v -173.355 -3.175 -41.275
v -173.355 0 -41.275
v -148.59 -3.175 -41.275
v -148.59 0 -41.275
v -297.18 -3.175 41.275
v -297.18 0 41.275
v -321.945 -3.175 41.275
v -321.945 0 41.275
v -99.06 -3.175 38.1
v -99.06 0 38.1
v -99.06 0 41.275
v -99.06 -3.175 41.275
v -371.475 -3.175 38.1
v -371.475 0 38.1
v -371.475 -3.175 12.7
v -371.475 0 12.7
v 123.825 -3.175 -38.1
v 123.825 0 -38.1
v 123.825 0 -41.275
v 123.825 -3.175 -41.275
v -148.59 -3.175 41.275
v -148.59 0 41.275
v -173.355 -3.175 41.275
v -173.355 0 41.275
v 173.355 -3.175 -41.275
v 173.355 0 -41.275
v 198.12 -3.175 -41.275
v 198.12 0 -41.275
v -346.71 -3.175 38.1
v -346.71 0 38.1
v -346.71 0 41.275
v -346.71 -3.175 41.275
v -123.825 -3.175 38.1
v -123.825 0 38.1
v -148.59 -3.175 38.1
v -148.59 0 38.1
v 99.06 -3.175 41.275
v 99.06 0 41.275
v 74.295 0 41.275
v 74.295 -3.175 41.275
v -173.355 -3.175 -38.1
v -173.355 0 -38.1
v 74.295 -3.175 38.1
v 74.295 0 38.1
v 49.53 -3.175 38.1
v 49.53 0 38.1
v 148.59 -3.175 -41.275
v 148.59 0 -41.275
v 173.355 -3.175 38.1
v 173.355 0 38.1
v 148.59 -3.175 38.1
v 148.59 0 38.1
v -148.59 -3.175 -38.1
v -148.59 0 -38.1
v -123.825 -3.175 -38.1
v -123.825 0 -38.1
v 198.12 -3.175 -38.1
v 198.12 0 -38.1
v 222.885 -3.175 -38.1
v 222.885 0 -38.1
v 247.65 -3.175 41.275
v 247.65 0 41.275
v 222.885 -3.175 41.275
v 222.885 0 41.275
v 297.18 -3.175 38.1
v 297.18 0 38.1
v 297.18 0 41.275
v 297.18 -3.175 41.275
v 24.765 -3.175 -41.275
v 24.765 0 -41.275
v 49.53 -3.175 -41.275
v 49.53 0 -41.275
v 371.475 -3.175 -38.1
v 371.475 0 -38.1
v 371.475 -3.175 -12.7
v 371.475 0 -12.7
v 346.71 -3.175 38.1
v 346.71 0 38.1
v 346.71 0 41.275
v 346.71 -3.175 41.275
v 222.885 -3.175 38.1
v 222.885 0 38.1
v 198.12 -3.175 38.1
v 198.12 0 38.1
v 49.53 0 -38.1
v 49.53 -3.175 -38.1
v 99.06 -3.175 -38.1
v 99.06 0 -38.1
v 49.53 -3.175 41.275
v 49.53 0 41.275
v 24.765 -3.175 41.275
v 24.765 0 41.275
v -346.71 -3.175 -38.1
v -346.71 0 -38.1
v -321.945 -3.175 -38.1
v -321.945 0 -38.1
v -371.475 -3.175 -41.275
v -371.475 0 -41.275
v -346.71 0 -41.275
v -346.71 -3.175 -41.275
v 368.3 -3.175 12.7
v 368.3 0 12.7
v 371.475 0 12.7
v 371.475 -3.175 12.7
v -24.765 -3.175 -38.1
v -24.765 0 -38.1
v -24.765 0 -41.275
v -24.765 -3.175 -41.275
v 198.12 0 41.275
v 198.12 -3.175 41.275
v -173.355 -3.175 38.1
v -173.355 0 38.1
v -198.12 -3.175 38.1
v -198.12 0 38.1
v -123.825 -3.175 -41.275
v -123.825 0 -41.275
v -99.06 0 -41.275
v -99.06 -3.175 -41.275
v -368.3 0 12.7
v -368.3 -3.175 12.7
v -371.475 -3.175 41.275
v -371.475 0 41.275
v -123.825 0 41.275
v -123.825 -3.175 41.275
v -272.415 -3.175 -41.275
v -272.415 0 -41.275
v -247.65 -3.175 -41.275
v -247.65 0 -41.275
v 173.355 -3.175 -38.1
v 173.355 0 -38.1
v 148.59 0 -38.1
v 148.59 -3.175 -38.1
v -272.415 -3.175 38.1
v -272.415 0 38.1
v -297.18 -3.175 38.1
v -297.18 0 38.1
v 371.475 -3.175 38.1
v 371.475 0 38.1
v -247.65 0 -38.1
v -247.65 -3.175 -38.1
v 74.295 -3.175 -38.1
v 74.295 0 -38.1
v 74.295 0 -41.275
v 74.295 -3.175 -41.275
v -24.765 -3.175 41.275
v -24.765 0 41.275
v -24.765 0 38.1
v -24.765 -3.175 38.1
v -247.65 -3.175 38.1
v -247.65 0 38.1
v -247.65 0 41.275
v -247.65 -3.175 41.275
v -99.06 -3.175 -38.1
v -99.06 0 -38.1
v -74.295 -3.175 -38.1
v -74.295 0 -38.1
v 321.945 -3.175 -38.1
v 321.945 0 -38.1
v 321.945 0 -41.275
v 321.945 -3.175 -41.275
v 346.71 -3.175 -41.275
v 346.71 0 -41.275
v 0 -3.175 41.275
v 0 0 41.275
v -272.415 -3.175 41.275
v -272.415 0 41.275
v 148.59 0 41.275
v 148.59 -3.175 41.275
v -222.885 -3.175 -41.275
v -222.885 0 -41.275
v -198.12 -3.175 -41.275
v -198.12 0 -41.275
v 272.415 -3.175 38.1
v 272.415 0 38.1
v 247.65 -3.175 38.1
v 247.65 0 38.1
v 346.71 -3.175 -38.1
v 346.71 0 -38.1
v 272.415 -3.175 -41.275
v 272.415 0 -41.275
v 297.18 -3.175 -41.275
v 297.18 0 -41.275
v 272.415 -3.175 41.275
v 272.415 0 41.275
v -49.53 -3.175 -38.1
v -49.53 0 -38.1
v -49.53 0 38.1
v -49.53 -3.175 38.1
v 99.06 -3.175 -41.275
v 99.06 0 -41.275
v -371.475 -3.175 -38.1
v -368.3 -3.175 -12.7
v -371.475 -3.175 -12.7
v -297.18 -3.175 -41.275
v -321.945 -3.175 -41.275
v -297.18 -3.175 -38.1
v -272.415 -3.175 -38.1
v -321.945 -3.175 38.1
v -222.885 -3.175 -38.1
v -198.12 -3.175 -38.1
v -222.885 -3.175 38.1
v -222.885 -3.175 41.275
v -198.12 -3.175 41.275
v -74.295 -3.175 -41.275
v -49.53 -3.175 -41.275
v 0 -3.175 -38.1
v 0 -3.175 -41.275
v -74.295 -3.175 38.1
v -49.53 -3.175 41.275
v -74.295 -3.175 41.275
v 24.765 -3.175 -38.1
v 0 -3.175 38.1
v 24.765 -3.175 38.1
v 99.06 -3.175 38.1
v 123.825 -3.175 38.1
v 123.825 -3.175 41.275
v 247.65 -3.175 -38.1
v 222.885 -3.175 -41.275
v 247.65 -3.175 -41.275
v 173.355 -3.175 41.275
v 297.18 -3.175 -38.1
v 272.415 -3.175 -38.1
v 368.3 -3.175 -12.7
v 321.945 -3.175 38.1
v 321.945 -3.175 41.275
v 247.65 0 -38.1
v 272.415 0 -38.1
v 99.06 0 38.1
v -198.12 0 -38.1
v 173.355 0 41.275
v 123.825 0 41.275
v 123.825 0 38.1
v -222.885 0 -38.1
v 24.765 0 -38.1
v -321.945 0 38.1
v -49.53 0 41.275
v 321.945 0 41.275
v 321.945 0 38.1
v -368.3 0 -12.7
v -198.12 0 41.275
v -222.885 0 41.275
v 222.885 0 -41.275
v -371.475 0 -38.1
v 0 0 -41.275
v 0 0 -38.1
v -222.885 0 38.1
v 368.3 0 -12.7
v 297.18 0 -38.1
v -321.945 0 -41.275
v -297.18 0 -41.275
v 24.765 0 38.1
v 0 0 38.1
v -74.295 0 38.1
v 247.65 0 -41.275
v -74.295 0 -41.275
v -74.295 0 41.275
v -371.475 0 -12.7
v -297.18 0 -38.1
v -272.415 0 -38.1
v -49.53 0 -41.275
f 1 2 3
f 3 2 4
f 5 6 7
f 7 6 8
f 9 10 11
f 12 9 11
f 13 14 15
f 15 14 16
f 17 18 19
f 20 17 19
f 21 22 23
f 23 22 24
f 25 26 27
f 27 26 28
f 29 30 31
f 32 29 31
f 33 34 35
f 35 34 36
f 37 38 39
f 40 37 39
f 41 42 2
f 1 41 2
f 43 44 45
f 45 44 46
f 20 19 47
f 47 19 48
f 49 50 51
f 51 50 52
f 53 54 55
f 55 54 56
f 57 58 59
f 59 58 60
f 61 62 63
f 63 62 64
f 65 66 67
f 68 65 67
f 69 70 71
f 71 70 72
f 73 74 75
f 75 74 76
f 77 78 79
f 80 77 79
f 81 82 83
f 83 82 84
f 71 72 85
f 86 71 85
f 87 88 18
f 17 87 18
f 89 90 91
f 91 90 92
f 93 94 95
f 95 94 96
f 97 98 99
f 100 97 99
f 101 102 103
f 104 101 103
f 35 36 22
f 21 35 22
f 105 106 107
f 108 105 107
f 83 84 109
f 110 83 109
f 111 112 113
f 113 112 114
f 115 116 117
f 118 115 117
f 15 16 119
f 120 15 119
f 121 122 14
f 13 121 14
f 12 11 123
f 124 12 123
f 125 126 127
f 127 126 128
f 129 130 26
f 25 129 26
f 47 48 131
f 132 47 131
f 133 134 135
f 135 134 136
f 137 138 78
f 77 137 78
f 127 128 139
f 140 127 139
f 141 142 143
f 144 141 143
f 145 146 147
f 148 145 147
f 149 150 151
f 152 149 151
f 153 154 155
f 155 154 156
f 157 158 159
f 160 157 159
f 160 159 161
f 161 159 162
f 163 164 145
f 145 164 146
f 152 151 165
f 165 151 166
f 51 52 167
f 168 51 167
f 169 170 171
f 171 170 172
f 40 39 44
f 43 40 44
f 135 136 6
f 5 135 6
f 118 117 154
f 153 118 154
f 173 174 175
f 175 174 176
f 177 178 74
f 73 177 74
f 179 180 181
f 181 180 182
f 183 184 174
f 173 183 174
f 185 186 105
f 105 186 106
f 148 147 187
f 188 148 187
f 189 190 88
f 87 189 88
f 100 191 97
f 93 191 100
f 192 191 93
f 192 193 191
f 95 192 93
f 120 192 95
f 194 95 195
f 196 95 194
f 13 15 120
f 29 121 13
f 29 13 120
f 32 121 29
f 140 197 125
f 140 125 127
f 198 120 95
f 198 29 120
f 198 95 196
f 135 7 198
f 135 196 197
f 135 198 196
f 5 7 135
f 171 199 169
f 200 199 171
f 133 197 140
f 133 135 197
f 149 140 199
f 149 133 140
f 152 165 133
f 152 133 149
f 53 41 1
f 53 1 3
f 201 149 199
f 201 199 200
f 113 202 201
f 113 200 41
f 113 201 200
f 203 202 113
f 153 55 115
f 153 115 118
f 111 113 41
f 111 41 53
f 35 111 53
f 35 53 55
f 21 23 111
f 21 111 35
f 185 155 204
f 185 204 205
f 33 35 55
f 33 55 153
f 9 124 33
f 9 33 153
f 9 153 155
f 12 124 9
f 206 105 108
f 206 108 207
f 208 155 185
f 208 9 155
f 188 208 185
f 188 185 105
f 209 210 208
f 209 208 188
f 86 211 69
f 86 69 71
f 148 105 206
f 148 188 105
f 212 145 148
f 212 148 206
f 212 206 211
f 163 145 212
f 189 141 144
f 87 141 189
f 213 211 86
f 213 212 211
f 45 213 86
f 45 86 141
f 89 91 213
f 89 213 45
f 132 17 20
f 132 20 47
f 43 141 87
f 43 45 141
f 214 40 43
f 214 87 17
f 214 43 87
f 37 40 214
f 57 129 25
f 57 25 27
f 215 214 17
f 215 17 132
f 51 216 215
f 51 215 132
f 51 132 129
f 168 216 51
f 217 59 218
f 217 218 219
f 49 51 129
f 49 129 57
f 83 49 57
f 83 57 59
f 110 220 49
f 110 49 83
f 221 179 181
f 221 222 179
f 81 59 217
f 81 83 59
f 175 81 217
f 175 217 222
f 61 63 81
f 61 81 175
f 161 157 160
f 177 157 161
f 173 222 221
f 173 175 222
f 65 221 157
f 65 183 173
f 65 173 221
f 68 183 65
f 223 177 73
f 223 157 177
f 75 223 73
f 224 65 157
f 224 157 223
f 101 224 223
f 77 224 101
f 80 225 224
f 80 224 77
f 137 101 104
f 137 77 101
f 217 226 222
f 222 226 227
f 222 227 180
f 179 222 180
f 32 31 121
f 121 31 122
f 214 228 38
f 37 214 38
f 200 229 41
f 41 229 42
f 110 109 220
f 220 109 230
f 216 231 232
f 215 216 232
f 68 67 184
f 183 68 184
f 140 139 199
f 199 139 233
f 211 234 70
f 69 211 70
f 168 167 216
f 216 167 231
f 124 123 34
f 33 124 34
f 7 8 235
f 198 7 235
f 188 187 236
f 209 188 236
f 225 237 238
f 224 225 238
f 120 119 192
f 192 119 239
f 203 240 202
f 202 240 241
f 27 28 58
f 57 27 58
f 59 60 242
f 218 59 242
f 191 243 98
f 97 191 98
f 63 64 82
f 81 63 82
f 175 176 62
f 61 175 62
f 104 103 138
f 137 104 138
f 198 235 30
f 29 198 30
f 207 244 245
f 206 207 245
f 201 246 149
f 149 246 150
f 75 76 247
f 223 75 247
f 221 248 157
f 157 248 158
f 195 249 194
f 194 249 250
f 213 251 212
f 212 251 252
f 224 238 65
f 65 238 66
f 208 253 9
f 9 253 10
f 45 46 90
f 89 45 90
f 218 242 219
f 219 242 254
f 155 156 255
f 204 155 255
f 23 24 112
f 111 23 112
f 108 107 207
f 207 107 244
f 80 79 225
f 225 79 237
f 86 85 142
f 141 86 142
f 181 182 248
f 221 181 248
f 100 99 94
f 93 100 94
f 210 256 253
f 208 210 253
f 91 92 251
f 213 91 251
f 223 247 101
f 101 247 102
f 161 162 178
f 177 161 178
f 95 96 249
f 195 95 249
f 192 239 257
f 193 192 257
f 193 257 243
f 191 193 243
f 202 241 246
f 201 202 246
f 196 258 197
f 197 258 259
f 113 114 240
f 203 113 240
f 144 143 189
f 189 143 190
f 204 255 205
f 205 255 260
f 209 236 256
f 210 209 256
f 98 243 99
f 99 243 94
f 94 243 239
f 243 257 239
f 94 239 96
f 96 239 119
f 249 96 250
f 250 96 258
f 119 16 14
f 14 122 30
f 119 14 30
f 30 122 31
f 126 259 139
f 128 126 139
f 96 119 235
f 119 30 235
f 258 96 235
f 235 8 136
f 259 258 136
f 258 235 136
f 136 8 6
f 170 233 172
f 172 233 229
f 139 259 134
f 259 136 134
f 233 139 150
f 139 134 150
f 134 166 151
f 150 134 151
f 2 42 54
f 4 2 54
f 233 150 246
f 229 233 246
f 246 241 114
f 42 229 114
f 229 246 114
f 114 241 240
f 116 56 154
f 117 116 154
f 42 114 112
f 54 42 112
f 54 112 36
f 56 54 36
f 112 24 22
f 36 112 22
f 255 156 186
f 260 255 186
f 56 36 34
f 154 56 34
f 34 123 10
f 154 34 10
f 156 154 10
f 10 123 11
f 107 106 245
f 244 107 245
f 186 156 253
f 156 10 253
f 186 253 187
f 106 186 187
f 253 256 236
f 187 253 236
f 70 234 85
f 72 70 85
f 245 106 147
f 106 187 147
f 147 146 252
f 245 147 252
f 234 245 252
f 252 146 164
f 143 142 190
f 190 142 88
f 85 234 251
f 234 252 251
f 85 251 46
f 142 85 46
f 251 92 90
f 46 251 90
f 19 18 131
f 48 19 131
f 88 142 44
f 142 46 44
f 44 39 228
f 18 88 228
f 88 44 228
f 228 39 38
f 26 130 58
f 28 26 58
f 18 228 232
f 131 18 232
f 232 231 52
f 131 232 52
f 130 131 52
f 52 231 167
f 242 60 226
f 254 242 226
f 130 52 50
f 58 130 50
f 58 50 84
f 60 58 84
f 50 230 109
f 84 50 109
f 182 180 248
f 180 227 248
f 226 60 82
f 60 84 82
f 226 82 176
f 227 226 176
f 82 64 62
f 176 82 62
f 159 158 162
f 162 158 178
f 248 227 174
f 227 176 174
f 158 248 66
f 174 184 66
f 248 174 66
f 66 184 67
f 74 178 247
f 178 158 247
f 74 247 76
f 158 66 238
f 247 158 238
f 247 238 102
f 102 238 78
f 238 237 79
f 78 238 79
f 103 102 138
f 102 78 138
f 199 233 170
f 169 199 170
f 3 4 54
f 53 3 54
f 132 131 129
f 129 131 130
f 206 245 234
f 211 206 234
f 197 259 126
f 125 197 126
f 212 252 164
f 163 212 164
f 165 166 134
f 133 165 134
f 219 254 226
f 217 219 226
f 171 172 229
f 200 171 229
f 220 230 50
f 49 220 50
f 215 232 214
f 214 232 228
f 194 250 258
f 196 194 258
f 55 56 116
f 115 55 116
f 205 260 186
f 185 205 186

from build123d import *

# Parameters (mm, degrees)
F1_DEPTH = 3.175


# Not quite as in the source:
# - ends of sketch curves that miss each other by under 0.0002 mm in the source are joined


with BuildPart() as f1:
    # F0 (on Front) → F1 (new body)
    with BuildSketch(Plane.XZ):
        Polygon((148.5900335276, 41.2750068545), (123.8250335276, 41.2750068545), (123.8250335276, 38.1000068545), (99.0600335276, 38.1000068545), (99.0600335276, 41.2750068545), (74.2950335276, 41.2750068545), (74.2950335276, 38.1000068545), (49.5300335276, 38.1000068545), (49.5300335276, 41.2750068545), (24.7650335276, 41.2750068545), (24.7650335276, 38.1000068545), (3.35276e-05, 38.1000068545), (3.35276e-05, 41.2750068545), (-24.7649664724, 41.2750068545), (-24.7649664724, 38.1000068545), (-49.5299664724, 38.1000068545), (-49.5299664724, 41.2750068545), (-74.2949664724, 41.2750068545), (-74.2949664724, 38.1000068545), (-99.0599664724, 38.1000068545), (-99.0599664724, 41.2750068545), (-123.8249664724, 41.2750068545), (-123.8249664724, 38.1000068545), (-148.5899664724, 38.1000068545), (-148.5899664724, 41.2750068545), (-173.3549664724, 41.2750068545), (-173.3549664724, 38.1000068545), (-198.1199664724, 38.1000068545), (-198.1199664724, 41.2750068545), (-222.8849664724, 41.2750068545), (-222.8849664724, 38.1000068545), (-247.6499664724, 38.1000068545), (-247.6499664724, 41.2750068545), (-272.4149664724, 41.2750068545), (-272.4149664724, 38.1000068545), (-297.1799664724, 38.1000068545), (-297.1799664724, 41.2750068545), (-321.9449664724, 41.2750068545), (-321.9449664724, 38.1000068545), (-346.7099664724, 38.1000068545), (-346.7099664724, 41.2750068545), (-371.4749664724, 41.2750068545), (-371.475, 38.1), (-371.475, 12.7), (-368.3, 12.7), (-368.3, -12.7), (-371.475, -12.7), (-371.475, -38.1), (-371.475031665, -41.2750032454), (-346.710031665, -41.2750032454), (-346.710031665, -38.1000032454), (-321.945031665, -38.1000032454), (-321.945031665, -41.2750032454), (-297.180031665, -41.2750032454), (-297.180031665, -38.1000032454), (-272.415031665, -38.1000032454), (-272.415031665, -41.2750032454), (-247.650031665, -41.2750032454), (-247.650031665, -38.1000032454), (-222.885031665, -38.1000032454), (-222.885031665, -41.2750032454), (-198.120031665, -41.2750032454), (-198.120031665, -38.1000032454), (-173.355031665, -38.1000032454), (-173.355031665, -41.2750032454), (-148.590031665, -41.2750032454), (-148.590031665, -38.1000032454), (-123.825031665, -38.1000032454), (-123.825031665, -41.2750032454), (-99.060031665, -41.2750032454), (-99.060031665, -38.1000032454), (-74.295031665, -38.1000032454), (-74.295031665, -41.2750032454), (-49.530031665, -41.2750032454), (-49.530031665, -38.1000032454), (-24.765031665, -38.1000032454), (-24.765031665, -41.2750032454), (-3.1665e-05, -41.2750032454), (-3.1665e-05, -38.1000032454), (24.764968335, -38.1000032454), (24.764968335, -41.2750032454), (49.529968335, -41.2750032454), (49.529968335, -38.1000032454), (74.294968335, -38.1000032454), (74.294968335, -41.2750032454), (92.075, -41.2750032454), (99.059968335, -41.2750032454), (99.059968335, -38.1000032454), (123.824968335, -38.1000032454), (123.824968335, -41.2750032454), (148.589968335, -41.2750032454), (148.589968335, -38.1000032454), (173.354968335, -38.1000032454), (173.354968335, -41.2750032454), (198.119968335, -41.2750032454), (198.119968335, -38.1000032454), (222.884968335, -38.1000032454), (222.884968335, -41.2750032454), (244.475, -41.2750032454), (247.649968335, -41.2750032454), (247.649968335, -38.1000032454), (272.414968335, -38.1000032454), (272.414968335, -41.2750032454), (297.179968335, -41.2750032454), (297.179968335, -38.1000032454), (321.944968335, -38.1000032454), (321.944968335, -41.2750032454), (346.709968335, -41.2750032453), (346.709968335, -38.1000032454), (371.474968335, -38.0999963909), (371.475, -12.7), (368.3, -12.7), (368.3, 12.7), (371.475, 12.7), (371.475, 38.1), (368.3, 38.1), (346.7100335276, 38.1), (346.7100335276, 41.2750068545), (321.9450335276, 41.2750068544), (321.9450335276, 38.1000068545), (297.1800335276, 38.1000068545), (297.1800335276, 41.2750068545), (272.4150335276, 41.2750068545), (272.4150335276, 38.1000068545), (247.6500335276, 38.1000068545), (247.6500335276, 41.2750068545), (222.8850335276, 41.2750068545), (222.8850335276, 38.1000068545), (198.1200335276, 38.1000068545), (198.1200335276, 41.2750068545), (173.3550335276, 41.2750068545), (173.3550335276, 38.1000068545), (148.5900335276, 38.1000068545), align=None)
    extrude(amount=F1_DEPTH)


solid = f1.part
